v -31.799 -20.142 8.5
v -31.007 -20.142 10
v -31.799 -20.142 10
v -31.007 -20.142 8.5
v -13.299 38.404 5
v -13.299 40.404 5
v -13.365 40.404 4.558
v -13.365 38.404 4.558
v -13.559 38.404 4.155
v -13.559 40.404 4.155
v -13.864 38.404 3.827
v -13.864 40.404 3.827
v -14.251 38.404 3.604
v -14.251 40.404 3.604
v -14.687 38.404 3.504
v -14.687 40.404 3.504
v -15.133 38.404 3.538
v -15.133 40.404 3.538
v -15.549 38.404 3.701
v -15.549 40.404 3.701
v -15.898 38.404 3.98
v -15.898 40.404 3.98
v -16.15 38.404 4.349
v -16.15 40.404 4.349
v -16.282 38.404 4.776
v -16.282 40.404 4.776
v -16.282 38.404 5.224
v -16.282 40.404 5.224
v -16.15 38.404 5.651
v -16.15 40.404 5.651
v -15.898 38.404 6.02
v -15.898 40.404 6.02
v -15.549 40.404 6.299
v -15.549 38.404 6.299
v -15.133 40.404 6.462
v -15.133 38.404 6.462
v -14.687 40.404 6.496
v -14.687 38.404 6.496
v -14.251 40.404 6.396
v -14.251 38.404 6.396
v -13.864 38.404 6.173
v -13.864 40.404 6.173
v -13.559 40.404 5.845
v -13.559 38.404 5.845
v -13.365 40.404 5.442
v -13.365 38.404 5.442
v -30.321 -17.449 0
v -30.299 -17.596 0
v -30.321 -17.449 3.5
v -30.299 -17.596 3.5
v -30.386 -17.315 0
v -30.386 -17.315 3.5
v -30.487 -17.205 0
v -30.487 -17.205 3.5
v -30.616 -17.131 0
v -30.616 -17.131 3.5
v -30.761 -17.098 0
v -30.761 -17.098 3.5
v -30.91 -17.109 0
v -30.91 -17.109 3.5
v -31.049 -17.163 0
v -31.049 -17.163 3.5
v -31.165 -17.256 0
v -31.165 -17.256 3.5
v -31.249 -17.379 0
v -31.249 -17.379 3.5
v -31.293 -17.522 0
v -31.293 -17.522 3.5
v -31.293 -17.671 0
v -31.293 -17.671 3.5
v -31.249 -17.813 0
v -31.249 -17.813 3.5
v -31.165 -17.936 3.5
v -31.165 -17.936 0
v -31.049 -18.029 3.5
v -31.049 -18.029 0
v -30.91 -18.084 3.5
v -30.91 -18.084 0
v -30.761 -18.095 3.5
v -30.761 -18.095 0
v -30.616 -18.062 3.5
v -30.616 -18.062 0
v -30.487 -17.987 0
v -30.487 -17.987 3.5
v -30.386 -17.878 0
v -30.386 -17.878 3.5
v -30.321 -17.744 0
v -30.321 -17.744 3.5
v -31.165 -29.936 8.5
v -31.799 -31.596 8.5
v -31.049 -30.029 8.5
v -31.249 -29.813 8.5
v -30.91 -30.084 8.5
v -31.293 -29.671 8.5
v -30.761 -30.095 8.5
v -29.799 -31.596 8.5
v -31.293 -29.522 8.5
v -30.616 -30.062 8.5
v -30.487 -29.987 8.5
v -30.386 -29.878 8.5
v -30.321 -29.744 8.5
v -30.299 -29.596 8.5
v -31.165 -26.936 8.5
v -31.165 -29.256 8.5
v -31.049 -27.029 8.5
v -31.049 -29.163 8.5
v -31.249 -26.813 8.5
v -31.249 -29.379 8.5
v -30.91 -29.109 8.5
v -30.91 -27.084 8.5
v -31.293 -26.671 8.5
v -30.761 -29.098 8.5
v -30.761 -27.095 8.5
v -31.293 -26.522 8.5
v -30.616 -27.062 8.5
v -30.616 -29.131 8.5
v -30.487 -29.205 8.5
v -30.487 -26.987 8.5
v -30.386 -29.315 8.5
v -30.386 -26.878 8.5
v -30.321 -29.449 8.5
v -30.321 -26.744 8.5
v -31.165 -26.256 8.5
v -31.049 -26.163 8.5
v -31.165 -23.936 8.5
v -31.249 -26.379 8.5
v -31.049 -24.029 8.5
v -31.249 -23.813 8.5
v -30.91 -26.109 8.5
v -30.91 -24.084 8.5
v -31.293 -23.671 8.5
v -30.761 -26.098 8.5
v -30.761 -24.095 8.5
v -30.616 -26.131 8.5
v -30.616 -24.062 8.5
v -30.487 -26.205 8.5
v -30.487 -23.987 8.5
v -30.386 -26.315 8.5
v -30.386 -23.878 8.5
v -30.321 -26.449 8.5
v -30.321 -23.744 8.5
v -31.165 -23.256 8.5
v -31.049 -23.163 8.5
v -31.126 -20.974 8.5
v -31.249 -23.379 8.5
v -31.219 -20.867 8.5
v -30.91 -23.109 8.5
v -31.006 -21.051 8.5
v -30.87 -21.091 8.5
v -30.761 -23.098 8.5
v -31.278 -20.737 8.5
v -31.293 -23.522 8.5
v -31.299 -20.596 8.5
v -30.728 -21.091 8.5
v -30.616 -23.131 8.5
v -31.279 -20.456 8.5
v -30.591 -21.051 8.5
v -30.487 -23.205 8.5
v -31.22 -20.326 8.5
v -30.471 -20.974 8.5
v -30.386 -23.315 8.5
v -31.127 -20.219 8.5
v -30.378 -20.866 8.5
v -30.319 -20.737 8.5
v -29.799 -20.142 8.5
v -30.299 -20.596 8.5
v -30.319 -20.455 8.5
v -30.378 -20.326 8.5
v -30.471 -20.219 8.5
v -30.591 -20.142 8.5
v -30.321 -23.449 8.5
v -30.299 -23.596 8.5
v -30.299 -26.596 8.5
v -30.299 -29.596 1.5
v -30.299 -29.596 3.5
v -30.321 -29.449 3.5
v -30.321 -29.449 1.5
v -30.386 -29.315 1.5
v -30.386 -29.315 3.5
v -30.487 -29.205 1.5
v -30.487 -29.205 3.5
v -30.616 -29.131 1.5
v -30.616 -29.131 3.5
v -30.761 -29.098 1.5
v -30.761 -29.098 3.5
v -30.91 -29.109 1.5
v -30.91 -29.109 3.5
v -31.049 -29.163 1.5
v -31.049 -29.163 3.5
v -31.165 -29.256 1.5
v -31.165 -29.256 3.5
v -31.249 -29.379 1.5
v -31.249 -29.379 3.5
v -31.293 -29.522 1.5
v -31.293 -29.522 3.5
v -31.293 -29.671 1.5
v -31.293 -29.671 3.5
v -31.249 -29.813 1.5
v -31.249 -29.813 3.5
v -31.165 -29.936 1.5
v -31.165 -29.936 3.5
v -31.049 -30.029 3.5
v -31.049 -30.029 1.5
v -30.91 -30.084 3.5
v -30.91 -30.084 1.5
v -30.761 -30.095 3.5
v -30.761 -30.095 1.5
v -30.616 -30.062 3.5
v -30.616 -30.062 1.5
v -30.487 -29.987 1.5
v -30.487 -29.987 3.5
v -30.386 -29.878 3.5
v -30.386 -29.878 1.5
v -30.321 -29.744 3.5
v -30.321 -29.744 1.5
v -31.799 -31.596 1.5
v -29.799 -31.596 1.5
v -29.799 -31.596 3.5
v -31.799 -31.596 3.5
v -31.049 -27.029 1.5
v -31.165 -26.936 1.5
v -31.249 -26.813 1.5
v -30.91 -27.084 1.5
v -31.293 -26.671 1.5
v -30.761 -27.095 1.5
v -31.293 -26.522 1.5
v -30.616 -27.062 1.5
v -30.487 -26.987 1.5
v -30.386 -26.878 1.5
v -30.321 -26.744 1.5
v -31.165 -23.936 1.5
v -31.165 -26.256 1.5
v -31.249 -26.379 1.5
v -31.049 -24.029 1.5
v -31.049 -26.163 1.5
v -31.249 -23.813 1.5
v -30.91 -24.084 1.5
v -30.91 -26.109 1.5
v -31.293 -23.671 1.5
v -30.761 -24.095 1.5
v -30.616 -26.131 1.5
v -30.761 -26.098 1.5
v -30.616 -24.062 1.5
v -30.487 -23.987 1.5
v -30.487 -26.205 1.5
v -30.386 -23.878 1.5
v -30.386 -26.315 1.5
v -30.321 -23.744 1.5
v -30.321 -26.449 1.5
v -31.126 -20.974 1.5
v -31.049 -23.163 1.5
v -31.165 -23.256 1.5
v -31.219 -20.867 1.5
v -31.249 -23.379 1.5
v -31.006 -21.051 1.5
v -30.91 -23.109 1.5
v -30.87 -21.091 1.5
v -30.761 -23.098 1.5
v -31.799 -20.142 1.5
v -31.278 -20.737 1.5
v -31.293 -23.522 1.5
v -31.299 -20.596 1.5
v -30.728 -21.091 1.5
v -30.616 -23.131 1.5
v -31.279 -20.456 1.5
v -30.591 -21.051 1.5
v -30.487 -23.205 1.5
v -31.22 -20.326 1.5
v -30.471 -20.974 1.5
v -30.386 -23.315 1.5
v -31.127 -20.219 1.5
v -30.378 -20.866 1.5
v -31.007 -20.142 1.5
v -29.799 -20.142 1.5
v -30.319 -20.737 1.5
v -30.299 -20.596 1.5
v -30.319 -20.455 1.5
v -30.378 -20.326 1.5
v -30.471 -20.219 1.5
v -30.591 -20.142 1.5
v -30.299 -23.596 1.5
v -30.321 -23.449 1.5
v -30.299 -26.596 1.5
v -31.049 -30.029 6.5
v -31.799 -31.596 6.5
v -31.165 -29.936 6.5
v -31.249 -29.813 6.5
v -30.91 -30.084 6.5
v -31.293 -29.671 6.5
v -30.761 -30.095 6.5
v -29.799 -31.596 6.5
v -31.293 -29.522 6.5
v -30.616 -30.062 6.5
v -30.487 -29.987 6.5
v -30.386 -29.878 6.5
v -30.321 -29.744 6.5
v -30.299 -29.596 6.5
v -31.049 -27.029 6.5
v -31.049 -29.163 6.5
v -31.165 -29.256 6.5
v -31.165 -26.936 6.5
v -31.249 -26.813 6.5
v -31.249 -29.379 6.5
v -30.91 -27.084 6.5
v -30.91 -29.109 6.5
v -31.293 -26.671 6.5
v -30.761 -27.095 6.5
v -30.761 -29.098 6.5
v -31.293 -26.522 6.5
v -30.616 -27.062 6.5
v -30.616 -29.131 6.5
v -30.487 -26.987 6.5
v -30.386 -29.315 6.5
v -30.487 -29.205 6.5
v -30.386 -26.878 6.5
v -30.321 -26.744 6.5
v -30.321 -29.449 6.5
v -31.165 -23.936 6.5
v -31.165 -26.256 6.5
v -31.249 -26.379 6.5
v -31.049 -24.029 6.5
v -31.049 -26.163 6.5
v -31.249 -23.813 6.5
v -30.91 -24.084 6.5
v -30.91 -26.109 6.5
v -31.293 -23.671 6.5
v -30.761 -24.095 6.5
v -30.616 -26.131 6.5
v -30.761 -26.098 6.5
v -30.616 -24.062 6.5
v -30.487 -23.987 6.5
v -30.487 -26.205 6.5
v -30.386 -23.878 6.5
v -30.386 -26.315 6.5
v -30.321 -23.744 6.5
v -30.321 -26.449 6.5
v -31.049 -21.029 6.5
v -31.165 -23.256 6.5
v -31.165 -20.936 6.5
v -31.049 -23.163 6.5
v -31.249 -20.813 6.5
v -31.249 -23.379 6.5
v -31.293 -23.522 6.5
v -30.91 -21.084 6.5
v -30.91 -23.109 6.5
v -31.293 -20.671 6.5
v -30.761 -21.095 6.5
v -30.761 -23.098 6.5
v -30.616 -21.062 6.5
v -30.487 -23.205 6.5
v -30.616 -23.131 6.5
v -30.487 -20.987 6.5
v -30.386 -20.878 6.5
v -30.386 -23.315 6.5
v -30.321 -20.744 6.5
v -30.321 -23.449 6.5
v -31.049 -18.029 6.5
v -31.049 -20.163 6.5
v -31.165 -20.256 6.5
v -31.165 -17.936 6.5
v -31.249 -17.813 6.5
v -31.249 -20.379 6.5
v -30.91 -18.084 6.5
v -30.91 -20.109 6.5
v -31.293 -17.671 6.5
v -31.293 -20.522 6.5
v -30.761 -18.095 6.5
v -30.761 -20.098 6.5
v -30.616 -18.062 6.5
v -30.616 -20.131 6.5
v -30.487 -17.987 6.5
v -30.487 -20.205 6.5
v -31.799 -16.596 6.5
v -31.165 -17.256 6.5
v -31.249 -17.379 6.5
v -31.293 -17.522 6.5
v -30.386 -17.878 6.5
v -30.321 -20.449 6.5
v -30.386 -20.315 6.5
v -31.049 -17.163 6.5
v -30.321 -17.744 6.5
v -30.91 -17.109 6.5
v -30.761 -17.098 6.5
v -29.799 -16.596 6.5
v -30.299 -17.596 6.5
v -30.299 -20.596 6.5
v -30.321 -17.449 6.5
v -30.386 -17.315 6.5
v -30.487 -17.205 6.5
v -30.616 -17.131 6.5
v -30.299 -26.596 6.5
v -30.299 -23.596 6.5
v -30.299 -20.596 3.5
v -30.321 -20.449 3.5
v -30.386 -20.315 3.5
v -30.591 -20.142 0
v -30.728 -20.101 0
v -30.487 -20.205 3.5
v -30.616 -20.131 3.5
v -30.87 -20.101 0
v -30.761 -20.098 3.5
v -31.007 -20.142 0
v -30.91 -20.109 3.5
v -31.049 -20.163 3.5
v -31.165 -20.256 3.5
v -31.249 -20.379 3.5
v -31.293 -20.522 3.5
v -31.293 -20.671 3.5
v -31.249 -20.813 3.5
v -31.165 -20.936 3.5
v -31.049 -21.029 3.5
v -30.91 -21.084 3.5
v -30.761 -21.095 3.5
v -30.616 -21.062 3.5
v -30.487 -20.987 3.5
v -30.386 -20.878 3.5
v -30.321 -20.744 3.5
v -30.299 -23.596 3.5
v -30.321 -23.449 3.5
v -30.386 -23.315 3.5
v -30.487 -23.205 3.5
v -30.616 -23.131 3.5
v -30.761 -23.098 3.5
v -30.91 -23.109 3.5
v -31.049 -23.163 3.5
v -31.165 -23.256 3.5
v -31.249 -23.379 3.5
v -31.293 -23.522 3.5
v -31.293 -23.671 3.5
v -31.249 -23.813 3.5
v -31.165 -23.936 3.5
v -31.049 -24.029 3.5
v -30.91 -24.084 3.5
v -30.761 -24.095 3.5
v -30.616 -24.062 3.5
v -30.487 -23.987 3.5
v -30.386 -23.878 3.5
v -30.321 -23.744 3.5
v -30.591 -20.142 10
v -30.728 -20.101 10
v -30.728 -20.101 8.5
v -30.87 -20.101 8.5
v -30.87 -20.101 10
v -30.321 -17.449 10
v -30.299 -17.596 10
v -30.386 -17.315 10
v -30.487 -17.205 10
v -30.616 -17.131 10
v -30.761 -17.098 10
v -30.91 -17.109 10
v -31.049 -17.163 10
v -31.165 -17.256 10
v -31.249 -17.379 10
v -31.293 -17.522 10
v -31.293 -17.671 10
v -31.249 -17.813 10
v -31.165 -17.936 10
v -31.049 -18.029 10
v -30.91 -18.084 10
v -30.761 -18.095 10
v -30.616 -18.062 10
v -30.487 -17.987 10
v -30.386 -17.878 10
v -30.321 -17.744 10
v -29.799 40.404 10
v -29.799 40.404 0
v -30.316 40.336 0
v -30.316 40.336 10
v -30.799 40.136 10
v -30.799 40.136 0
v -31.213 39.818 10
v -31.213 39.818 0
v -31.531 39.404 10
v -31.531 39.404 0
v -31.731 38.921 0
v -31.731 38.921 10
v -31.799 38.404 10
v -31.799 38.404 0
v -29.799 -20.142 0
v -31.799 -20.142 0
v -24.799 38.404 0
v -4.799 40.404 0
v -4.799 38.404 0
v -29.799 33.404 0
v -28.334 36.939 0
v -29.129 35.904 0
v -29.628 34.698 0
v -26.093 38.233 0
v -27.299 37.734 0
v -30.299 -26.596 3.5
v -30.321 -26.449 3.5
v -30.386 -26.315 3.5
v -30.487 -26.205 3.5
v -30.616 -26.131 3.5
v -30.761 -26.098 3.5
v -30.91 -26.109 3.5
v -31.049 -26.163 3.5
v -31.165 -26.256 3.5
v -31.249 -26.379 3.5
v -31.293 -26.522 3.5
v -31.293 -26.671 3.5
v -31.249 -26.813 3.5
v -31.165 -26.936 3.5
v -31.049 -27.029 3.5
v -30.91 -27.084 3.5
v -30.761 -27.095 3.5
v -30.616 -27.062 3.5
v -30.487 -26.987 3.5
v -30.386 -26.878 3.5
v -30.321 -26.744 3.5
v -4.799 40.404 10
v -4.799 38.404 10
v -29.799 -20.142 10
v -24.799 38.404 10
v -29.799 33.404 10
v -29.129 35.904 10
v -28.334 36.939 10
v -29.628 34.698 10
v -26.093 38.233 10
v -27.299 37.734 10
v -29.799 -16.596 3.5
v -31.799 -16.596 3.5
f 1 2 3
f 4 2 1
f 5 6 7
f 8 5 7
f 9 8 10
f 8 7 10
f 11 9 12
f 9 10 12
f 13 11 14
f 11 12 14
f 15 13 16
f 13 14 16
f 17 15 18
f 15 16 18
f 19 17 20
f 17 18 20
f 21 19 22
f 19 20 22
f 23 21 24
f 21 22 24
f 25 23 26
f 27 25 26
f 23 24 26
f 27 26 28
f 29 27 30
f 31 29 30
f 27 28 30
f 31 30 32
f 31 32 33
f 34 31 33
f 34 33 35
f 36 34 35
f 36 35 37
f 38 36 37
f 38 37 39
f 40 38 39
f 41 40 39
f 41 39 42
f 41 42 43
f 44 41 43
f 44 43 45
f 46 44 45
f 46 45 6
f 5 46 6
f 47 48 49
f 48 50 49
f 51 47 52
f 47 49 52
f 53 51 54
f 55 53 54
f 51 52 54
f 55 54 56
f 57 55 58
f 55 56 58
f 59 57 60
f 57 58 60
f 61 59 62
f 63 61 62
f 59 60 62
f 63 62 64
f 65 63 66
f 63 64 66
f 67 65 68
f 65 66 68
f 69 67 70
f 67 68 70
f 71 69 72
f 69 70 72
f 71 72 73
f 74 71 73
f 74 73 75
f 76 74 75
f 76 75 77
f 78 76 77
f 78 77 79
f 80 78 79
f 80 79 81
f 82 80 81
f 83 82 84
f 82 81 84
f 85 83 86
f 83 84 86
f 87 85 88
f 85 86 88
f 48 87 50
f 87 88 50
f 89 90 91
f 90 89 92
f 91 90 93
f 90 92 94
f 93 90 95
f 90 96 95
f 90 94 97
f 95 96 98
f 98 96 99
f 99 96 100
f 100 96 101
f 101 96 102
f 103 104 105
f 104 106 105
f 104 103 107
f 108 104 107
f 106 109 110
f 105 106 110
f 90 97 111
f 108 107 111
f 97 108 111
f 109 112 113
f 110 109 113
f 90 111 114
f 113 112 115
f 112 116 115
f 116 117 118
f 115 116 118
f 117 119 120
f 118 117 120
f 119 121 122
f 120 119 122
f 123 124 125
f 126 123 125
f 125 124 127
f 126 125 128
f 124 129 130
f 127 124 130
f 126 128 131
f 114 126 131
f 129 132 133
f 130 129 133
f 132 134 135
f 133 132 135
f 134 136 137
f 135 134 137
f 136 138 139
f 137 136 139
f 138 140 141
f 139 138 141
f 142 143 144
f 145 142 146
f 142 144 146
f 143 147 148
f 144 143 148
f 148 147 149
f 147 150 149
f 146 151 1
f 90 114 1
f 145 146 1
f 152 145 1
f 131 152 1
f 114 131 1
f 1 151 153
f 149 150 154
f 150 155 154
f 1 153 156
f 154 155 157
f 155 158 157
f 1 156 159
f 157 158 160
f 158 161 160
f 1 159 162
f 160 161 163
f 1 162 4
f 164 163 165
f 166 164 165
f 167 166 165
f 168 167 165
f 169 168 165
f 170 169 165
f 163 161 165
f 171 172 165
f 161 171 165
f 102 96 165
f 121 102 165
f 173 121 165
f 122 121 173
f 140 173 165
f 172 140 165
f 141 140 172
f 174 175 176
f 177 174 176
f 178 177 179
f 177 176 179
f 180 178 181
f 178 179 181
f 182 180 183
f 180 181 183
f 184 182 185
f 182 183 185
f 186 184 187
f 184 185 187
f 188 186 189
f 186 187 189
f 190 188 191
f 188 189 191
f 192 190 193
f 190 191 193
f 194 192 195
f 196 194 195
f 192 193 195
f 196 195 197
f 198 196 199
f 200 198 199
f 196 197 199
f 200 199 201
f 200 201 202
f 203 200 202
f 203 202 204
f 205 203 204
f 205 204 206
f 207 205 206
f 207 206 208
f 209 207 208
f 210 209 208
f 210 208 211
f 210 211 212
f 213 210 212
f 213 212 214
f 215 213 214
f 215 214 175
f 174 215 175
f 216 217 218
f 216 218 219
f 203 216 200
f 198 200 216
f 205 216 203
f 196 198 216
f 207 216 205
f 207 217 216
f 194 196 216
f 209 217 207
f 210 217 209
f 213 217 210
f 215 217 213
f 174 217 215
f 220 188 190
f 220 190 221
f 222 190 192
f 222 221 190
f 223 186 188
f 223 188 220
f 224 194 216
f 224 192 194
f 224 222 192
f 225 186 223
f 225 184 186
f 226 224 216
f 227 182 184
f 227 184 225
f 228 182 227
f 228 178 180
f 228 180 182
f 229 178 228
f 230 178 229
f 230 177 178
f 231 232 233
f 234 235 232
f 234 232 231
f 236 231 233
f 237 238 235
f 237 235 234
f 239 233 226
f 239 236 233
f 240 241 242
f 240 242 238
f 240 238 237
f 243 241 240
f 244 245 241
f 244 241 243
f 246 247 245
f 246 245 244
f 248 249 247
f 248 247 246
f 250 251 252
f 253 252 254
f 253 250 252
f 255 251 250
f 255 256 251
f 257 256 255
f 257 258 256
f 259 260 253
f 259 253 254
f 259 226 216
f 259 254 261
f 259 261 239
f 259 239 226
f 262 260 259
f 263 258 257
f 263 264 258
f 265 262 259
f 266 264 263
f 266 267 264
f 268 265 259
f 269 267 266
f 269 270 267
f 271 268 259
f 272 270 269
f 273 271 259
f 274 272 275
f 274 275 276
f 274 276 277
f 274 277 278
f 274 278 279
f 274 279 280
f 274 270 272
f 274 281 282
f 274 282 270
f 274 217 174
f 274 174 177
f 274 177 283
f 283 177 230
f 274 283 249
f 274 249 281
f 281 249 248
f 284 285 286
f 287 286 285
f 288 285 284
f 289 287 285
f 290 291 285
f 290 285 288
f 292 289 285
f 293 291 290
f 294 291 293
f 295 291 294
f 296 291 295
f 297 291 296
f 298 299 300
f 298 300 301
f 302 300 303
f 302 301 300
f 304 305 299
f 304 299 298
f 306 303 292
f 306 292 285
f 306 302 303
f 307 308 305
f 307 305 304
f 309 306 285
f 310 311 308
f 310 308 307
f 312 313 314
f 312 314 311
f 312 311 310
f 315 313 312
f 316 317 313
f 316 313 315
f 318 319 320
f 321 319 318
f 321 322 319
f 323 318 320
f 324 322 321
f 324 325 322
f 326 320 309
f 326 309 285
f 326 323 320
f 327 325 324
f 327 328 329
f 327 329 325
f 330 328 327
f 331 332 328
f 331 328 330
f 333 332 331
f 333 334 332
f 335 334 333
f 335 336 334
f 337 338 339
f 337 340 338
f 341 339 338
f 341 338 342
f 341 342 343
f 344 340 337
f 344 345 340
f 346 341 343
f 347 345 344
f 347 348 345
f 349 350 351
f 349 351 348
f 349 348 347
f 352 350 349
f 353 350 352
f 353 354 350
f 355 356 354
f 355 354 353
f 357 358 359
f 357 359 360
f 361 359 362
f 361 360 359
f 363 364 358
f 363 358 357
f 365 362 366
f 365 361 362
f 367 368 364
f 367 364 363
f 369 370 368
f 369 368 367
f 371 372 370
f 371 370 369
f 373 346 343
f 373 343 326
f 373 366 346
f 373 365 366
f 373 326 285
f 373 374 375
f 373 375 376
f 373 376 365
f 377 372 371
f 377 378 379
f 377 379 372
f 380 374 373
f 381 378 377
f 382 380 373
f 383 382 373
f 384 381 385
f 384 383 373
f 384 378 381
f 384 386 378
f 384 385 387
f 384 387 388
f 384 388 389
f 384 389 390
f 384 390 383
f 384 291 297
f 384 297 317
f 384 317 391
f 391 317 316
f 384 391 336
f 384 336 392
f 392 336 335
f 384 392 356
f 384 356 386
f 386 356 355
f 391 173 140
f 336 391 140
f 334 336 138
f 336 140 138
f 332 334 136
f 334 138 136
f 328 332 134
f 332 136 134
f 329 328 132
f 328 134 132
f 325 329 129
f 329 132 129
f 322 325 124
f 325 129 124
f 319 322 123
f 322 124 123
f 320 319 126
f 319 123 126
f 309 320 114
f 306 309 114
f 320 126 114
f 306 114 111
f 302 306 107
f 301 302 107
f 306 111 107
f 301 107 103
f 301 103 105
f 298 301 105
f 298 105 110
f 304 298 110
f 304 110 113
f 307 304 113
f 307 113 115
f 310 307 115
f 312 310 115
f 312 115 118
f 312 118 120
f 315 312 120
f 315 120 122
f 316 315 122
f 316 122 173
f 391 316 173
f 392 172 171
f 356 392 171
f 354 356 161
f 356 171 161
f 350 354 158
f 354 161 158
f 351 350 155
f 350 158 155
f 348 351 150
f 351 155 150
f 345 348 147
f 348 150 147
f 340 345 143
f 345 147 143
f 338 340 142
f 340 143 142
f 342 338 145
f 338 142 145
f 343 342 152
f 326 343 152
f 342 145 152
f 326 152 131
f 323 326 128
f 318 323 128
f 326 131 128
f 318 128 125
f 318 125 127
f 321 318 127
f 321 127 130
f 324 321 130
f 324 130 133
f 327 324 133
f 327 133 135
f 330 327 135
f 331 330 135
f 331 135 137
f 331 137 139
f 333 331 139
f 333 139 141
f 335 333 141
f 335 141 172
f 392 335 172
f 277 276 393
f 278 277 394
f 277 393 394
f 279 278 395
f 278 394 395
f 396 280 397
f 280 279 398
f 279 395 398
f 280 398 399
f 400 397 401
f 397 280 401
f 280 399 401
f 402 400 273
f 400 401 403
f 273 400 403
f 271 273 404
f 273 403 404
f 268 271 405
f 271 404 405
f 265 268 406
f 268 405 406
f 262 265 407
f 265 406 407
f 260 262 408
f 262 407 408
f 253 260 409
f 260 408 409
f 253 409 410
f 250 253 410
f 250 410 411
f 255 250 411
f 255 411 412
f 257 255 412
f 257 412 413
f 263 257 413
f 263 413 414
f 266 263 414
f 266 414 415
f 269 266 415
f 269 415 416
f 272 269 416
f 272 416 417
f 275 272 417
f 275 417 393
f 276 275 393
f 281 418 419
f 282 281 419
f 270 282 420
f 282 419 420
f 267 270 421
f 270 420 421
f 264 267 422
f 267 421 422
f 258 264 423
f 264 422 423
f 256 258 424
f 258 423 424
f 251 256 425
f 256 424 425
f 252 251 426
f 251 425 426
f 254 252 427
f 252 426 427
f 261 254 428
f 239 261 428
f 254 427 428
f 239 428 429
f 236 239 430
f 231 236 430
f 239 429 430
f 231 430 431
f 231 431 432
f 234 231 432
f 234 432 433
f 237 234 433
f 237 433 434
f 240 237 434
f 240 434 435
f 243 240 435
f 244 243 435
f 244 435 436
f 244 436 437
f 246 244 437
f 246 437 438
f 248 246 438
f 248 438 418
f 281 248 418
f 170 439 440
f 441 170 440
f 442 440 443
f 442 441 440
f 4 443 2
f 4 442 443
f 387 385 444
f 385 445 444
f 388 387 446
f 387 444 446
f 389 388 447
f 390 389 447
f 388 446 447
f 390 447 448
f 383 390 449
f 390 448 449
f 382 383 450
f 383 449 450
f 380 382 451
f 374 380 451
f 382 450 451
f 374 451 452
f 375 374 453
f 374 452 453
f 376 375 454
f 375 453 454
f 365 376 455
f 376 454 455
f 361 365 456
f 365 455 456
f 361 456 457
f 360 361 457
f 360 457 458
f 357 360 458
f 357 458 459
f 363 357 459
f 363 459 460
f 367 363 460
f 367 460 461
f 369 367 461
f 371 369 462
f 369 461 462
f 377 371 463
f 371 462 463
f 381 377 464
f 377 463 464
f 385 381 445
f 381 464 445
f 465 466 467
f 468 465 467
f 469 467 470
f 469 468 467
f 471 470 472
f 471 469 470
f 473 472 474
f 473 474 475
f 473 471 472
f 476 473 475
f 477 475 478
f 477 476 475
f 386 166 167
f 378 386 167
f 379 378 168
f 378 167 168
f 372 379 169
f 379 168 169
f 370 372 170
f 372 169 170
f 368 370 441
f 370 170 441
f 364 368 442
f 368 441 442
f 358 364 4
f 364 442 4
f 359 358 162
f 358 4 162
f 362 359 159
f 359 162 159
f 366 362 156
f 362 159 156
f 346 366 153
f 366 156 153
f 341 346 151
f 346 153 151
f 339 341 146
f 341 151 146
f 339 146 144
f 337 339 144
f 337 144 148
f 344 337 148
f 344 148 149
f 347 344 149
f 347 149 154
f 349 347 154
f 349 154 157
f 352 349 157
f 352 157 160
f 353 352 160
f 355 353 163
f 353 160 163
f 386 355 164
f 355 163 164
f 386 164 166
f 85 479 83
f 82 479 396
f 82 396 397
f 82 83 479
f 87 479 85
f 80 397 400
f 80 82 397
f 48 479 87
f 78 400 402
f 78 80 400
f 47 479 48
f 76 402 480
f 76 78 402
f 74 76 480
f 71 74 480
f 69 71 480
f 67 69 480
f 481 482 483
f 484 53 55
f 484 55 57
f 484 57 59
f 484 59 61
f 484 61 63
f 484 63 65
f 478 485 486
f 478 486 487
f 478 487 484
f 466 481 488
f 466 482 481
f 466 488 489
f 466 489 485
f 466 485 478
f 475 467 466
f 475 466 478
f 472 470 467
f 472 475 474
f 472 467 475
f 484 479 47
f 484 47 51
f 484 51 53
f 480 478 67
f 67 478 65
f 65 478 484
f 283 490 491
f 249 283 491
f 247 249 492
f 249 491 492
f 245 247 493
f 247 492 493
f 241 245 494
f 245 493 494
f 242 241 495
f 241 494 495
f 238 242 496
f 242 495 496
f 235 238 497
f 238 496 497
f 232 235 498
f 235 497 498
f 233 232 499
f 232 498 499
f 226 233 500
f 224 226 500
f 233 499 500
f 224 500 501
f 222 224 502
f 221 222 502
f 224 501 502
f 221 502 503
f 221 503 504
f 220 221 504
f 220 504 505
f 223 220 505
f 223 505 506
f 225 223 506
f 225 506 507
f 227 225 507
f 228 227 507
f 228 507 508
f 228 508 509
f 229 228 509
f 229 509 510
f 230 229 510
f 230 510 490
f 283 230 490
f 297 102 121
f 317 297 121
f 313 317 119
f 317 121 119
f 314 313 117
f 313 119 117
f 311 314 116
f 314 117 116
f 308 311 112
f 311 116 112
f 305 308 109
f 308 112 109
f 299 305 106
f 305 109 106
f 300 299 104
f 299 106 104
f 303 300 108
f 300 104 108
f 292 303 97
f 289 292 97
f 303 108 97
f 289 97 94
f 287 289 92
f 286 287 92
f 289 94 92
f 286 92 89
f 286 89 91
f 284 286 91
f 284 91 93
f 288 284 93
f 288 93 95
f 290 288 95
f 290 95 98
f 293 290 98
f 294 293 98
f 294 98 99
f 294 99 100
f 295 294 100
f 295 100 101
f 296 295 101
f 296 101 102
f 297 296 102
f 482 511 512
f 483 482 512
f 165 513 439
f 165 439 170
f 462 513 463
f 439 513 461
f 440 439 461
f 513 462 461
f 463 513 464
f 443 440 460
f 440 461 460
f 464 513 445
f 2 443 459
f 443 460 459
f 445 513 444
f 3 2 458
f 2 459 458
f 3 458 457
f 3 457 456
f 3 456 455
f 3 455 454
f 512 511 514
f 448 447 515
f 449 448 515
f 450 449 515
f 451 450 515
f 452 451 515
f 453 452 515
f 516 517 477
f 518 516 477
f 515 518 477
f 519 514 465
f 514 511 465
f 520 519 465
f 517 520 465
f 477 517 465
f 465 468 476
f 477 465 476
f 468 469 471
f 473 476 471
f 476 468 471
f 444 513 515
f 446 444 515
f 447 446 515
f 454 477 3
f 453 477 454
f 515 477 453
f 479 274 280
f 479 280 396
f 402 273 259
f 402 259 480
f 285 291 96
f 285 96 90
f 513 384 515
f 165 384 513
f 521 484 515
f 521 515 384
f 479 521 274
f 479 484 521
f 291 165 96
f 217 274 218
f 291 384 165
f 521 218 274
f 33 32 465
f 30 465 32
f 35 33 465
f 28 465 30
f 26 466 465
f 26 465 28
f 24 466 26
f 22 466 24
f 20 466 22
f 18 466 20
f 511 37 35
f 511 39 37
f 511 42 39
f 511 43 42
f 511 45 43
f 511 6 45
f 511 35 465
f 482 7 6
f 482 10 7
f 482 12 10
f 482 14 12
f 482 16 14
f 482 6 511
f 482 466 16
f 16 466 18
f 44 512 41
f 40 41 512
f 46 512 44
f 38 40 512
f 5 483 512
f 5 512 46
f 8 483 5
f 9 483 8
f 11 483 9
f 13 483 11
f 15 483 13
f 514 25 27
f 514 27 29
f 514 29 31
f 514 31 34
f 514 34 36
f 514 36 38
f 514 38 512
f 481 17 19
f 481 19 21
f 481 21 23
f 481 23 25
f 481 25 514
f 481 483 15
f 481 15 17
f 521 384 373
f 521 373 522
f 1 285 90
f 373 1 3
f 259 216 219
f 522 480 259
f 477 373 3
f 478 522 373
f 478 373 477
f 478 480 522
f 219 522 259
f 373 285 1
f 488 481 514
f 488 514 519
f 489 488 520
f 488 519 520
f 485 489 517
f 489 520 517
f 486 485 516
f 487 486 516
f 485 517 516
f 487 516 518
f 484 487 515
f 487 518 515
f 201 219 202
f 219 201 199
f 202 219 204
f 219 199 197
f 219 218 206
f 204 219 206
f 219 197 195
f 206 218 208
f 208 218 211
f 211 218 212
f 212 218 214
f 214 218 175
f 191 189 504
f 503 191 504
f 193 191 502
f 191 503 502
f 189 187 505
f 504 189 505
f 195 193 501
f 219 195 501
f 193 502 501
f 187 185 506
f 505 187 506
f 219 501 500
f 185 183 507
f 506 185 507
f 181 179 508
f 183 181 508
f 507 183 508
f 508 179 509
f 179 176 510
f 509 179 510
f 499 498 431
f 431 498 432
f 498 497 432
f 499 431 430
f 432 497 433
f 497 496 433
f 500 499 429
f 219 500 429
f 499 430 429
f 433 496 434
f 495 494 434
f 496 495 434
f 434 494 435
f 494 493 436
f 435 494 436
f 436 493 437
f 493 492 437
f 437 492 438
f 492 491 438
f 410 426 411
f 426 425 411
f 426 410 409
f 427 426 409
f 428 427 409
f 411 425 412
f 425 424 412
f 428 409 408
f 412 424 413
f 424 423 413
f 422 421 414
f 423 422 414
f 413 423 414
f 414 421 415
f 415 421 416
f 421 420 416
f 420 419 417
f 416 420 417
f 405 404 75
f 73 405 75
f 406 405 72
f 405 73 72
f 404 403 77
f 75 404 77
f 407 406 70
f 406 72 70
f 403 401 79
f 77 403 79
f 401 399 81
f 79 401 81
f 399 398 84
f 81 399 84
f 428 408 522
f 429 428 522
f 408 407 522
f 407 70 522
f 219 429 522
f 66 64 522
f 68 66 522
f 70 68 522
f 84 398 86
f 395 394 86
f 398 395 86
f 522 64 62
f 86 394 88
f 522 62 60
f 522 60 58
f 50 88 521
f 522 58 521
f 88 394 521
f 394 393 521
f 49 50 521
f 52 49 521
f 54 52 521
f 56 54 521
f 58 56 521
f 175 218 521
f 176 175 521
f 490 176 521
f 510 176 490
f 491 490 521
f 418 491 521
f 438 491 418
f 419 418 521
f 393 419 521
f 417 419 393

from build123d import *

# Parameters (mm, degrees)
Y_KSEKLIK_EKSTR_ZYON1_DEPTH = 10
IZIM2_W                     = 1.5
IZIM2_H                     = 11.454648232
IZIM2_W_2                   = 3
IZIM2_H_2                   = 15
KES_EKSTR_ZYON1_DEPTH       = 10
IZIM3_R                     = 0.5
KES_EKSTR_ZYON2_DEPTH       = 22
IZIM4_R                     = 1.5
KES_EKSTR_ZYON3_DEPTH       = 44
RADYUS1_R                   = 5
RADYUS2_R                   = 2


with BuildPart() as part:
    # Çizim1 → Yükseklik-Ekstrüzyon1 (new body)
    with BuildSketch(Plane.XY):
        Polygon((-4.798797212, 38.403805497), (-29.798797212, 38.403805497), (-29.798797212, -31.596194503), (-31.798797212, -31.596194503), (-31.798797212, 40.403805497), (-4.798797212, 40.403805497), align=None)
    extrude(amount=Y_KSEKLIK_EKSTR_ZYON1_DEPTH)

    # Çizim2 → Kes-Ekstrüzyon1 (cut)
    with BuildSketch(Plane(origin=(-29.798797212, 0, 0), x_dir=(0, 0, -1), z_dir=(1, 0, 0))):
        with Locations((-9.25, -25.868870387)):
            Rectangle(IZIM2_W, IZIM2_H)
        with Locations((-0.75, -25.868870387)):
            Rectangle(IZIM2_W, IZIM2_H)
        with Locations((-5, -24.096194503)):
            Rectangle(IZIM2_W_2, IZIM2_H_2)
    extrude(amount=-KES_EKSTR_ZYON1_DEPTH, mode=Mode.SUBTRACT)

    # Çizim3 → Kes-Ekstrüzyon2 (cut, symmetric)
    with BuildSketch(Plane.XY.offset(8.5)):
        with Locations((-30.798797212, -29.596194503)):
            Circle(IZIM3_R)
        with Locations((-30.798797212, -26.596194503)):
            Circle(IZIM3_R)
        with Locations((-30.798797212, -23.596194503)):
            Circle(IZIM3_R)
        with Locations((-30.798797212, -20.596194503)):
            Circle(IZIM3_R)
        with Locations((-30.798797212, -17.596194503)):
            Circle(IZIM3_R)
    extrude(amount=KES_EKSTR_ZYON2_DEPTH, both=True, mode=Mode.SUBTRACT)

    # Çizim4 → Kes-Ekstrüzyon3 (cut)
    with BuildSketch(Plane(origin=(0, 40.403805497, 0), x_dir=(1, 0, 0), z_dir=(0, 1, 0))):
        with Locations((-14.798797212, -5)):
            Circle(IZIM4_R)
    extrude(amount=-KES_EKSTR_ZYON3_DEPTH, mode=Mode.SUBTRACT)

    # Radyus1
    radyus1_edges = [part.edges().sort_by_distance(p)[0] for p in [
        (-29.798797212, 38.403805497, 5),
    ]]
    fillet(radyus1_edges, radius=RADYUS1_R)

    # Radyus2
    radyus2_edges = [part.edges().sort_by_distance(p)[0] for p in [
        (-31.798797212, 40.403805497, 5),
    ]]
    fillet(radyus2_edges, radius=RADYUS2_R)


solid = part.part
